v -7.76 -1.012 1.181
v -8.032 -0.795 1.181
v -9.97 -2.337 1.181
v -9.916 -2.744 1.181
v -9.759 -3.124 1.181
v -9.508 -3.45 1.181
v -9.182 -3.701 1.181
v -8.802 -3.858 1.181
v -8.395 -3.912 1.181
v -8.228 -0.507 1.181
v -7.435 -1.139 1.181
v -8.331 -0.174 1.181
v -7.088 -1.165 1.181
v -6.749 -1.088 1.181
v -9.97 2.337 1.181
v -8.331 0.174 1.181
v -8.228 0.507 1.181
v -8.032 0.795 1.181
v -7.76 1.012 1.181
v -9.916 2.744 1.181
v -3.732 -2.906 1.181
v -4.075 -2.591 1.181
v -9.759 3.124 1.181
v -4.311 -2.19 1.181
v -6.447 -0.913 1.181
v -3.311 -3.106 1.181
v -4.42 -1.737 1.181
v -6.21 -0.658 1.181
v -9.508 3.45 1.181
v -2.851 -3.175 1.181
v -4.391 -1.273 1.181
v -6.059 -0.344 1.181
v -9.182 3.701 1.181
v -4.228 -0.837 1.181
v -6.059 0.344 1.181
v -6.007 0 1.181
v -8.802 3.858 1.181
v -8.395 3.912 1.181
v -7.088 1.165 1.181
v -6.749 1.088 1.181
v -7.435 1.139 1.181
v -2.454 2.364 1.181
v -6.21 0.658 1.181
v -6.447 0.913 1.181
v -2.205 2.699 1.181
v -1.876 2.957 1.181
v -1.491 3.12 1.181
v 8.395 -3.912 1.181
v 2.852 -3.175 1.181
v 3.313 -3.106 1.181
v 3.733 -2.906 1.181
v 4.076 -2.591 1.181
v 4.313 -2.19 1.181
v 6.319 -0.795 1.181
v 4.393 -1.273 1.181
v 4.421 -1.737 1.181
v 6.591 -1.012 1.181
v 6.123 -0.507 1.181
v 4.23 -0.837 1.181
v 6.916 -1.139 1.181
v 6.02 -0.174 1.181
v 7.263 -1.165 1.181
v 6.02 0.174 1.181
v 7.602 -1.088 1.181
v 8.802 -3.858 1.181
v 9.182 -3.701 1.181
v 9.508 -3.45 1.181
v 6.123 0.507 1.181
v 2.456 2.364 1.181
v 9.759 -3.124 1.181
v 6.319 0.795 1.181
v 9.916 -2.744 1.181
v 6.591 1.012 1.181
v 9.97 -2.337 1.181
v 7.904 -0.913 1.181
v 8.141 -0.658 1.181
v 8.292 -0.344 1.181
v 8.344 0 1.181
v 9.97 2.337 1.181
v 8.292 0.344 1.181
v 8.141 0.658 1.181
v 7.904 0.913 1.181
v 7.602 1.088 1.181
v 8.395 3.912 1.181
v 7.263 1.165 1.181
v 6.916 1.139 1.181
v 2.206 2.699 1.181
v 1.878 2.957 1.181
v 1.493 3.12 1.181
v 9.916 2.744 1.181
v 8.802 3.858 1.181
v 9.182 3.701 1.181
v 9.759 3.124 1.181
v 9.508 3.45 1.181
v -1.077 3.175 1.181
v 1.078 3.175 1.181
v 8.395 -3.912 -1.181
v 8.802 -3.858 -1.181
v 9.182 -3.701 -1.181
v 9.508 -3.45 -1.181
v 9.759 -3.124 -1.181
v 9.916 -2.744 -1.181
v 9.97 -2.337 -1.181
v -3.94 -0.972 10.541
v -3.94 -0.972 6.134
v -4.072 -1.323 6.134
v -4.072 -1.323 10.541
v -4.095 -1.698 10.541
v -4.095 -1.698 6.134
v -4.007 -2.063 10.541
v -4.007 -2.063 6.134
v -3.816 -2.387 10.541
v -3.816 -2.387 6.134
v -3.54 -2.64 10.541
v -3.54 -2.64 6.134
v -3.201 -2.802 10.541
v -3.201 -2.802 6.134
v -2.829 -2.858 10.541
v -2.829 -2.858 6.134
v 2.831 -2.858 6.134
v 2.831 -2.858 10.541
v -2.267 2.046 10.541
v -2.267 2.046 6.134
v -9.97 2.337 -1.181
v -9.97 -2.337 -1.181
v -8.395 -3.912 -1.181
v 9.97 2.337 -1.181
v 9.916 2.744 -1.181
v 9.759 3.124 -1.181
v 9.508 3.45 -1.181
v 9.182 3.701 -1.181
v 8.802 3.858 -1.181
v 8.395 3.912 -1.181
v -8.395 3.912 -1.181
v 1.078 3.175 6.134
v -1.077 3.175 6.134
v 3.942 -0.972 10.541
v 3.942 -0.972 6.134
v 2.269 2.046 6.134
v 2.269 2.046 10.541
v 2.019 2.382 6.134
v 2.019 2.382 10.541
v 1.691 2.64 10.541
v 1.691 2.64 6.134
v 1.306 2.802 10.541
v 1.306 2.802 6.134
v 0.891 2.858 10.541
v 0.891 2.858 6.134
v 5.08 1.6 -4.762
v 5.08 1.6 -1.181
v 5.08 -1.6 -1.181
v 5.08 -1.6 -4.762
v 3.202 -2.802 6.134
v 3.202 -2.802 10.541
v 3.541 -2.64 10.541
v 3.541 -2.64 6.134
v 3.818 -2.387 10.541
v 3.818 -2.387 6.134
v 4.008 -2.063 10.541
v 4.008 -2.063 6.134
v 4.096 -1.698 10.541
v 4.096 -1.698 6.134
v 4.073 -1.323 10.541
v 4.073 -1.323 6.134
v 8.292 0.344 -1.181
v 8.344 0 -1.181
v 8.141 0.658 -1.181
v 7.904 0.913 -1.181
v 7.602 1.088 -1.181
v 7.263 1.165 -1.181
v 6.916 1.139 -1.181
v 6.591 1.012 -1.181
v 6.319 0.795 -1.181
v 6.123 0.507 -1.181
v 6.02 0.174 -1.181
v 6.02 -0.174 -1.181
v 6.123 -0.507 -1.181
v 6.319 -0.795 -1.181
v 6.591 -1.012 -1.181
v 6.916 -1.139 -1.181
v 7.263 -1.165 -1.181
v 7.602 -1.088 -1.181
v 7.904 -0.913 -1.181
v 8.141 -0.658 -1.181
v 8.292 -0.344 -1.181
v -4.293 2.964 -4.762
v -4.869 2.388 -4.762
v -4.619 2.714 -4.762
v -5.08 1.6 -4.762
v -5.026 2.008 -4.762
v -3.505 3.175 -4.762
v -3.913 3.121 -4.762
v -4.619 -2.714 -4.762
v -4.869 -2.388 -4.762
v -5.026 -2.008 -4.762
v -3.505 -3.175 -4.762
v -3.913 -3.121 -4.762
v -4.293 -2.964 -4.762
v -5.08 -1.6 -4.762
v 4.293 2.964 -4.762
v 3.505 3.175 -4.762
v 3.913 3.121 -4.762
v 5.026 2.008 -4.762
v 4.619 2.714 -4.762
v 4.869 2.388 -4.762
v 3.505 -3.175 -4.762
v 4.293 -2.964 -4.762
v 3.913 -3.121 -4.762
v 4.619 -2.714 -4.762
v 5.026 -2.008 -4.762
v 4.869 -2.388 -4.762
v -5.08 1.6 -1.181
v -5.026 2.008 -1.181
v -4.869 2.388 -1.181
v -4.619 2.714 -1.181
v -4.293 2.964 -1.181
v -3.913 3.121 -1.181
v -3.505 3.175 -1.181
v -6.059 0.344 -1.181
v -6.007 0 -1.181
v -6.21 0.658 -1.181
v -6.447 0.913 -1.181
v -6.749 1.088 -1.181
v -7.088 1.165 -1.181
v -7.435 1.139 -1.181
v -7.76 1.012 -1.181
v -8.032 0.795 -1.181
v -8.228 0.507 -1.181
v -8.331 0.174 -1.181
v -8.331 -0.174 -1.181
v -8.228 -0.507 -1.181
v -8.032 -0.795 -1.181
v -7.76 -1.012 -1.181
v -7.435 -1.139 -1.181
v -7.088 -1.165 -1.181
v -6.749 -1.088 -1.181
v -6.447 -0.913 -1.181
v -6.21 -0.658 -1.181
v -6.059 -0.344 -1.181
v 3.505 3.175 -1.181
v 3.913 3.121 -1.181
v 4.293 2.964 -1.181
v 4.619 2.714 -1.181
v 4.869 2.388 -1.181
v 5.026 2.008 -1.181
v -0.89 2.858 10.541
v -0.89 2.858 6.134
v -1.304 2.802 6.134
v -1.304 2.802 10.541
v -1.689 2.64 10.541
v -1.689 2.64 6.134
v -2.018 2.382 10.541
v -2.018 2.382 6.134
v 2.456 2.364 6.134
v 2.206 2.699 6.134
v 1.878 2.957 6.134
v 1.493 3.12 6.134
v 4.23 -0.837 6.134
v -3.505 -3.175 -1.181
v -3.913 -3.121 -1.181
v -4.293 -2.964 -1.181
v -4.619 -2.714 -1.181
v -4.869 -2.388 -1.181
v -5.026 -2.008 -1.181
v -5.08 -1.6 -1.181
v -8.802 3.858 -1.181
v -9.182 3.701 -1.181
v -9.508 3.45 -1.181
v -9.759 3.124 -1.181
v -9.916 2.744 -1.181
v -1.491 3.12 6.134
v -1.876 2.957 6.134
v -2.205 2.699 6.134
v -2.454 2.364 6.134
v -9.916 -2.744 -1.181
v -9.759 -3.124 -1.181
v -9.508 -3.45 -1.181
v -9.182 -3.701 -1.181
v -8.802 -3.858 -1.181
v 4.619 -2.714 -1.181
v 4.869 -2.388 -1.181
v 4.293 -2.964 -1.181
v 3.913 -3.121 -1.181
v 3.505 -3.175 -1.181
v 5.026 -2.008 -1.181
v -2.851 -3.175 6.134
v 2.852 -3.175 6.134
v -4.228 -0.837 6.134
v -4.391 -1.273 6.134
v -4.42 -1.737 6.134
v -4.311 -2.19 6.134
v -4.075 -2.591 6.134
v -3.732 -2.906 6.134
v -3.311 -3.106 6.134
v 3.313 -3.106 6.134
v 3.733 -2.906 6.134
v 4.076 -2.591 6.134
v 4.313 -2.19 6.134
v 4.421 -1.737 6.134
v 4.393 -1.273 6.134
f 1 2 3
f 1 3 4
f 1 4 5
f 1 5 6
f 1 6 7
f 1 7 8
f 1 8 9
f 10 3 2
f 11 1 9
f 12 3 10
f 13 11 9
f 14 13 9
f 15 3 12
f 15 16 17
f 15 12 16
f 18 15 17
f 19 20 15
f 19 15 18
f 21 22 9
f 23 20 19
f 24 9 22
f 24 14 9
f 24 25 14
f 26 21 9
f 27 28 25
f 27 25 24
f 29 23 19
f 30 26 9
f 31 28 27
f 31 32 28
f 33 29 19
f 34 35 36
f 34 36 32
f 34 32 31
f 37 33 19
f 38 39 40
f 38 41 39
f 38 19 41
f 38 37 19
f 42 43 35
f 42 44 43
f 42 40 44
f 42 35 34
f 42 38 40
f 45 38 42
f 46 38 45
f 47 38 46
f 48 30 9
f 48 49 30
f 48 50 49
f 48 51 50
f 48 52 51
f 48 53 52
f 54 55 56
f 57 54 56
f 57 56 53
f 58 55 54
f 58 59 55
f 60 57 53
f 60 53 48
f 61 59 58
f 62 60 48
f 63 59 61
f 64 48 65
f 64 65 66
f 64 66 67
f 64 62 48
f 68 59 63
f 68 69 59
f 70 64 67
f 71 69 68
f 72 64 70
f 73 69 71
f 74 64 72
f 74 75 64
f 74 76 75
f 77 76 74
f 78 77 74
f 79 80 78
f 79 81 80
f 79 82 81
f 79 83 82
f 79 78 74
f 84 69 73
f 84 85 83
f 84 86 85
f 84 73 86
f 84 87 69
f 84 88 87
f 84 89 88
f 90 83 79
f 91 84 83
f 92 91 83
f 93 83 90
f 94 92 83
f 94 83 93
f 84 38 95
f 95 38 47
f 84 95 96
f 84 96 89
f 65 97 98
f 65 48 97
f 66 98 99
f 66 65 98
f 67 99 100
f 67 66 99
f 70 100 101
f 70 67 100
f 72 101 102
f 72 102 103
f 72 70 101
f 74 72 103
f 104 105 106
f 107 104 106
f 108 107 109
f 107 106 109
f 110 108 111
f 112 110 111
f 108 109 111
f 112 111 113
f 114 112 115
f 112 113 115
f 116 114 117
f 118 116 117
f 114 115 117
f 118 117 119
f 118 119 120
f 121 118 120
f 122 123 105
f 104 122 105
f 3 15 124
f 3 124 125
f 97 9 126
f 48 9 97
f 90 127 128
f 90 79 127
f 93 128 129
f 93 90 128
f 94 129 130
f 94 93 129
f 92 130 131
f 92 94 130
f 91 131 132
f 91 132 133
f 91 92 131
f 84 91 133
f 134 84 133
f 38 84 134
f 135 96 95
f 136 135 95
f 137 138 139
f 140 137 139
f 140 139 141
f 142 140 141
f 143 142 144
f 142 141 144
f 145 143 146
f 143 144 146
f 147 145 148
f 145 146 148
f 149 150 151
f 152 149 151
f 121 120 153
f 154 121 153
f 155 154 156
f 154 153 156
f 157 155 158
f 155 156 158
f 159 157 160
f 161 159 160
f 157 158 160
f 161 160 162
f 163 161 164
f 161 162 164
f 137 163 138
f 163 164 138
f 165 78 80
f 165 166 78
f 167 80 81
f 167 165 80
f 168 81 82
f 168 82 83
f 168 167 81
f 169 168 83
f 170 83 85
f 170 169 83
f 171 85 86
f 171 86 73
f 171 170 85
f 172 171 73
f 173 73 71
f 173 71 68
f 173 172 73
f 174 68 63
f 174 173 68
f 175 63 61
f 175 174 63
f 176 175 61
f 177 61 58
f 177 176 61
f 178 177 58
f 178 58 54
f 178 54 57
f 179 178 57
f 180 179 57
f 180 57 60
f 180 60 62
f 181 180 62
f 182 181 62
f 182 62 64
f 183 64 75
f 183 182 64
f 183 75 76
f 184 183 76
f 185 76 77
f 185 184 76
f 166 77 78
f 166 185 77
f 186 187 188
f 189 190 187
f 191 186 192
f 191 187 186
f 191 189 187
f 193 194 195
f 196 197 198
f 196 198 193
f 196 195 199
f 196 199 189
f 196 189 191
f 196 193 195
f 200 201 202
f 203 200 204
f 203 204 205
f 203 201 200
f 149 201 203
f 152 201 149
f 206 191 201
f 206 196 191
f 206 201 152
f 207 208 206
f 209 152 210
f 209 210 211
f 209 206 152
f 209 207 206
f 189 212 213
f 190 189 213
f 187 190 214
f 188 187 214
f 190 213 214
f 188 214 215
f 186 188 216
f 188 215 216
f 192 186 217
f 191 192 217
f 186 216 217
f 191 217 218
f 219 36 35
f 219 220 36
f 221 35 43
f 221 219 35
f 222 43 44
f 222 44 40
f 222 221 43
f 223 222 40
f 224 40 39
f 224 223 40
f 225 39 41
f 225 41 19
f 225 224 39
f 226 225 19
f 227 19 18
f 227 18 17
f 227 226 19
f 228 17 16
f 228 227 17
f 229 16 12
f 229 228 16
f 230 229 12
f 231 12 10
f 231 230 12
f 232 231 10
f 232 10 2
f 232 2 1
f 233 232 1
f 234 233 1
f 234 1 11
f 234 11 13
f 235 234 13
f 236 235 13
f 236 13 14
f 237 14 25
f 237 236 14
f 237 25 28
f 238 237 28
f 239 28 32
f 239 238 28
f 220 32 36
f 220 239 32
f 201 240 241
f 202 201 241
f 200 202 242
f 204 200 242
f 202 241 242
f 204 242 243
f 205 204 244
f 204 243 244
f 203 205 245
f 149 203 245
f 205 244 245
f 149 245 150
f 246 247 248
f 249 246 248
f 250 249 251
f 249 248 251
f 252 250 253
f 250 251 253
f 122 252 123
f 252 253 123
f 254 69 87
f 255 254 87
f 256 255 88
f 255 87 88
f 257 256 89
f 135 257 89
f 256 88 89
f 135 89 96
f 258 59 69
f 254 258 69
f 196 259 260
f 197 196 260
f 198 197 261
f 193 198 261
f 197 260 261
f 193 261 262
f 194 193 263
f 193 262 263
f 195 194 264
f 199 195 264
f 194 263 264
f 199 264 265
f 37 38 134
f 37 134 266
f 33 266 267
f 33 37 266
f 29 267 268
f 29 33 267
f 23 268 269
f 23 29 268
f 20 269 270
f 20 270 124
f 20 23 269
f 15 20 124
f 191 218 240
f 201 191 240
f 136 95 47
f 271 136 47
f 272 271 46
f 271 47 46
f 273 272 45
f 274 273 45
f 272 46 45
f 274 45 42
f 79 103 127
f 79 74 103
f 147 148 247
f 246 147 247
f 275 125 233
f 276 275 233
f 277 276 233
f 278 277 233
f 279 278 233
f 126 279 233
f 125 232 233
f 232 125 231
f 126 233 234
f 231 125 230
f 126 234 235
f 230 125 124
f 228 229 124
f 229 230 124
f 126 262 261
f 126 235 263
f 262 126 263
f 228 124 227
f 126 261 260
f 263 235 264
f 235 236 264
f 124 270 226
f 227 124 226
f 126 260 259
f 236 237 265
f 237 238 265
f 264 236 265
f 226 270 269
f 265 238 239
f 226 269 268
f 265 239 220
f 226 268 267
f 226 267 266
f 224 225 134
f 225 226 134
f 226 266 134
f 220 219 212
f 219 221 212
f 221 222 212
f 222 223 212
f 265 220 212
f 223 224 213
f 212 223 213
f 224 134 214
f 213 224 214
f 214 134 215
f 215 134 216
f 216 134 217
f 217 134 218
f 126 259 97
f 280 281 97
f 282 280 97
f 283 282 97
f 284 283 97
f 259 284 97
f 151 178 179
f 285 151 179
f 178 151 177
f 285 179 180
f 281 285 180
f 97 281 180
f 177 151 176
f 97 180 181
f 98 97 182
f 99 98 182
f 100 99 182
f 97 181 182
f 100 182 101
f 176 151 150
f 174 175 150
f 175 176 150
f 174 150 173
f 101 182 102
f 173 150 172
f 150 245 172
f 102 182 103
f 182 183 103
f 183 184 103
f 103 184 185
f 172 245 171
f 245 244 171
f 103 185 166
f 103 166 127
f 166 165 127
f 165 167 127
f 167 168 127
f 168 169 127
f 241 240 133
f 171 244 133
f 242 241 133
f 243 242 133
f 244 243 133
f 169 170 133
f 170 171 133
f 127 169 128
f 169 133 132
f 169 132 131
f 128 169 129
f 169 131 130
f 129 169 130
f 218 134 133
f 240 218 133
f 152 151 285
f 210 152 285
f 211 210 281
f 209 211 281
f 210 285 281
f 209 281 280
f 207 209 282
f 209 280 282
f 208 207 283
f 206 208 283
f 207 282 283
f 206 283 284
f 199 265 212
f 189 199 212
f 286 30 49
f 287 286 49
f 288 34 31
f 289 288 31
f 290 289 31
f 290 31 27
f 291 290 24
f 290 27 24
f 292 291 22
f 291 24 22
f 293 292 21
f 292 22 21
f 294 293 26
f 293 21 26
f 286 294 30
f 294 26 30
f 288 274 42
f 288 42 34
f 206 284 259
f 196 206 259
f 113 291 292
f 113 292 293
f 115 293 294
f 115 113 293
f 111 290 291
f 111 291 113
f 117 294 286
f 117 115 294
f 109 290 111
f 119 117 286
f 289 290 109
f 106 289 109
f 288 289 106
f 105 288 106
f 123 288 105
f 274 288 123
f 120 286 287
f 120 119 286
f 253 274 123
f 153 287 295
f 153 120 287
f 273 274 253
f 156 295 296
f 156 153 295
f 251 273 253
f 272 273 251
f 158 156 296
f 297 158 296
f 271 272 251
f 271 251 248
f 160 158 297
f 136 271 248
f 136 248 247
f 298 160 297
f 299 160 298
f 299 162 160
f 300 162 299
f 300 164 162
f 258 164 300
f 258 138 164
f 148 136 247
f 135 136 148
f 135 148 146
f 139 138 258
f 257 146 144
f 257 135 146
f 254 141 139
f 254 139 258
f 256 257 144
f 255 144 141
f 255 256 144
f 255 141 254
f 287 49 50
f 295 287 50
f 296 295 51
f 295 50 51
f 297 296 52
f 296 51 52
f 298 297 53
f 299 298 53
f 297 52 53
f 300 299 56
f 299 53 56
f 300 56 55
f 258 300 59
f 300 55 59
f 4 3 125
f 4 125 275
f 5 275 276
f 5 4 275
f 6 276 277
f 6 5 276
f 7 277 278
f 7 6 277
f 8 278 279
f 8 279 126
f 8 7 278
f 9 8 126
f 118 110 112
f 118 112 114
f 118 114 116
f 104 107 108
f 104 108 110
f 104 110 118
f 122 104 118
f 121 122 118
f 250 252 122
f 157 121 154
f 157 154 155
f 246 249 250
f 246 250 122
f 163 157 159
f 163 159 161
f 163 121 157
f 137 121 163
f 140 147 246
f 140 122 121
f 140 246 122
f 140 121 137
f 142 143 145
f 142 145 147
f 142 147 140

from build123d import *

# Parameters (mm, degrees)
F0_R     = 1.1684
F1_DEPTH = 1.1811
F3_DEPTH = 4.953
F5_DEPTH = 3.5814
F7_DEPTH = 4.4069


with BuildPart() as f1:
    # F0 (on Top) → F1 (new body, symmetric)
    with BuildSketch(Plane.XY):
        with BuildLine():
            Line((8.3947, 3.9116), (-8.3947, 3.9116))
            ThreePointArc((-8.3947, 3.9116), (-9.508252, 3.450352), (-9.9695, 2.3368))
            Line((-9.9695, 2.3368), (-9.9695, -2.3368))
            ThreePointArc((-9.9695, -2.3368), (-9.508252, -3.450352), (-8.3947, -3.9116))
            Line((-8.3947, -3.9116), (8.3947, -3.9116))
            ThreePointArc((8.3947, -3.9116), (9.508252, -3.450352), (9.9695, -2.3368))
            Line((9.9695, -2.3368), (9.9695, 2.3368))
            ThreePointArc((9.9695, 2.3368), (9.508252, 3.450352), (8.3947, 3.9116))
        make_face()
        with Locations((-7.1755, 0)):
            Circle(F0_R, mode=Mode.SUBTRACT)
        with Locations((7.1755, 0)):
            Circle(F0_R, mode=Mode.SUBTRACT)
    extrude(amount=F1_DEPTH, both=True)

    # F2 (on face) → F3 (join)
    with BuildSketch(Plane.XY.offset(1.1811)):
        with BuildLine():
            Line((-2.85102, -3.175), (2.852478, -3.175))
            ThreePointArc((2.852478, -3.175), (4.209371, -2.399471), (4.229829, -0.836722))
            Line((4.229829, -0.836722), (2.455818, 2.363678))
            ThreePointArc((2.455818, 2.363678), (1.877738, 2.957094), (1.078467, 3.175))
            Line((1.078467, 3.175), (-1.077009, 3.175))
            ThreePointArc((-1.077009, 3.175), (-1.876281, 2.957094), (-2.454361, 2.363678))
            Line((-2.454361, 2.363678), (-4.228371, -0.836722))
            ThreePointArc((-4.228371, -0.836722), (-4.207914, -2.399471), (-2.85102, -3.175))
        make_face()
    extrude(amount=F3_DEPTH)

    # F4 (on face) → F5 (join)
    with BuildSketch(Plane(origin=(0, 0, -1.1811), x_dir=(1, 0, 0), z_dir=(0, 0, -1))):
        with BuildLine():
            Line((3.5052, 3.175), (-3.5052, 3.175))
            ThreePointArc((-3.5052, 3.175), (-4.618752, 2.713752), (-5.08, 1.6002))
            Line((-5.08, 1.6002), (-5.08, -1.6002))
            ThreePointArc((-5.08, -1.6002), (-4.618752, -2.713752), (-3.5052, -3.175))
            Line((-3.5052, -3.175), (3.5052, -3.175))
            ThreePointArc((3.5052, -3.175), (4.618752, -2.713752), (5.08, -1.6002))
            Line((5.08, -1.6002), (5.08, 1.6002))
            ThreePointArc((5.08, 1.6002), (4.618752, 2.713752), (3.5052, 3.175))
        make_face()
    extrude(amount=F5_DEPTH)

    # F6 (on face) → F7 (join)
    with BuildSketch(Plane.XY.offset(6.1341)):
        with BuildLine():
            Line((0.891445, 2.8575), (-0.889988, 2.8575))
            ThreePointArc((-0.889988, 2.8575), (-1.689259, 2.639594), (-2.267339, 2.046178))
            Line((-2.267339, 2.046178), (-3.940227, -0.971792))
            ThreePointArc((-3.940227, -0.971792), (-3.923729, -2.232074), (-2.82946, -2.8575))
            Line((-2.82946, -2.8575), (2.830917, -2.8575))
            ThreePointArc((2.830917, -2.8575), (3.925186, -2.232074), (3.941684, -0.971792))
            Line((3.941684, -0.971792), (2.268796, 2.046178))
            ThreePointArc((2.268796, 2.046178), (1.690717, 2.639594), (0.891445, 2.8575))
        make_face()
    extrude(amount=F7_DEPTH)


solid = f1.part
